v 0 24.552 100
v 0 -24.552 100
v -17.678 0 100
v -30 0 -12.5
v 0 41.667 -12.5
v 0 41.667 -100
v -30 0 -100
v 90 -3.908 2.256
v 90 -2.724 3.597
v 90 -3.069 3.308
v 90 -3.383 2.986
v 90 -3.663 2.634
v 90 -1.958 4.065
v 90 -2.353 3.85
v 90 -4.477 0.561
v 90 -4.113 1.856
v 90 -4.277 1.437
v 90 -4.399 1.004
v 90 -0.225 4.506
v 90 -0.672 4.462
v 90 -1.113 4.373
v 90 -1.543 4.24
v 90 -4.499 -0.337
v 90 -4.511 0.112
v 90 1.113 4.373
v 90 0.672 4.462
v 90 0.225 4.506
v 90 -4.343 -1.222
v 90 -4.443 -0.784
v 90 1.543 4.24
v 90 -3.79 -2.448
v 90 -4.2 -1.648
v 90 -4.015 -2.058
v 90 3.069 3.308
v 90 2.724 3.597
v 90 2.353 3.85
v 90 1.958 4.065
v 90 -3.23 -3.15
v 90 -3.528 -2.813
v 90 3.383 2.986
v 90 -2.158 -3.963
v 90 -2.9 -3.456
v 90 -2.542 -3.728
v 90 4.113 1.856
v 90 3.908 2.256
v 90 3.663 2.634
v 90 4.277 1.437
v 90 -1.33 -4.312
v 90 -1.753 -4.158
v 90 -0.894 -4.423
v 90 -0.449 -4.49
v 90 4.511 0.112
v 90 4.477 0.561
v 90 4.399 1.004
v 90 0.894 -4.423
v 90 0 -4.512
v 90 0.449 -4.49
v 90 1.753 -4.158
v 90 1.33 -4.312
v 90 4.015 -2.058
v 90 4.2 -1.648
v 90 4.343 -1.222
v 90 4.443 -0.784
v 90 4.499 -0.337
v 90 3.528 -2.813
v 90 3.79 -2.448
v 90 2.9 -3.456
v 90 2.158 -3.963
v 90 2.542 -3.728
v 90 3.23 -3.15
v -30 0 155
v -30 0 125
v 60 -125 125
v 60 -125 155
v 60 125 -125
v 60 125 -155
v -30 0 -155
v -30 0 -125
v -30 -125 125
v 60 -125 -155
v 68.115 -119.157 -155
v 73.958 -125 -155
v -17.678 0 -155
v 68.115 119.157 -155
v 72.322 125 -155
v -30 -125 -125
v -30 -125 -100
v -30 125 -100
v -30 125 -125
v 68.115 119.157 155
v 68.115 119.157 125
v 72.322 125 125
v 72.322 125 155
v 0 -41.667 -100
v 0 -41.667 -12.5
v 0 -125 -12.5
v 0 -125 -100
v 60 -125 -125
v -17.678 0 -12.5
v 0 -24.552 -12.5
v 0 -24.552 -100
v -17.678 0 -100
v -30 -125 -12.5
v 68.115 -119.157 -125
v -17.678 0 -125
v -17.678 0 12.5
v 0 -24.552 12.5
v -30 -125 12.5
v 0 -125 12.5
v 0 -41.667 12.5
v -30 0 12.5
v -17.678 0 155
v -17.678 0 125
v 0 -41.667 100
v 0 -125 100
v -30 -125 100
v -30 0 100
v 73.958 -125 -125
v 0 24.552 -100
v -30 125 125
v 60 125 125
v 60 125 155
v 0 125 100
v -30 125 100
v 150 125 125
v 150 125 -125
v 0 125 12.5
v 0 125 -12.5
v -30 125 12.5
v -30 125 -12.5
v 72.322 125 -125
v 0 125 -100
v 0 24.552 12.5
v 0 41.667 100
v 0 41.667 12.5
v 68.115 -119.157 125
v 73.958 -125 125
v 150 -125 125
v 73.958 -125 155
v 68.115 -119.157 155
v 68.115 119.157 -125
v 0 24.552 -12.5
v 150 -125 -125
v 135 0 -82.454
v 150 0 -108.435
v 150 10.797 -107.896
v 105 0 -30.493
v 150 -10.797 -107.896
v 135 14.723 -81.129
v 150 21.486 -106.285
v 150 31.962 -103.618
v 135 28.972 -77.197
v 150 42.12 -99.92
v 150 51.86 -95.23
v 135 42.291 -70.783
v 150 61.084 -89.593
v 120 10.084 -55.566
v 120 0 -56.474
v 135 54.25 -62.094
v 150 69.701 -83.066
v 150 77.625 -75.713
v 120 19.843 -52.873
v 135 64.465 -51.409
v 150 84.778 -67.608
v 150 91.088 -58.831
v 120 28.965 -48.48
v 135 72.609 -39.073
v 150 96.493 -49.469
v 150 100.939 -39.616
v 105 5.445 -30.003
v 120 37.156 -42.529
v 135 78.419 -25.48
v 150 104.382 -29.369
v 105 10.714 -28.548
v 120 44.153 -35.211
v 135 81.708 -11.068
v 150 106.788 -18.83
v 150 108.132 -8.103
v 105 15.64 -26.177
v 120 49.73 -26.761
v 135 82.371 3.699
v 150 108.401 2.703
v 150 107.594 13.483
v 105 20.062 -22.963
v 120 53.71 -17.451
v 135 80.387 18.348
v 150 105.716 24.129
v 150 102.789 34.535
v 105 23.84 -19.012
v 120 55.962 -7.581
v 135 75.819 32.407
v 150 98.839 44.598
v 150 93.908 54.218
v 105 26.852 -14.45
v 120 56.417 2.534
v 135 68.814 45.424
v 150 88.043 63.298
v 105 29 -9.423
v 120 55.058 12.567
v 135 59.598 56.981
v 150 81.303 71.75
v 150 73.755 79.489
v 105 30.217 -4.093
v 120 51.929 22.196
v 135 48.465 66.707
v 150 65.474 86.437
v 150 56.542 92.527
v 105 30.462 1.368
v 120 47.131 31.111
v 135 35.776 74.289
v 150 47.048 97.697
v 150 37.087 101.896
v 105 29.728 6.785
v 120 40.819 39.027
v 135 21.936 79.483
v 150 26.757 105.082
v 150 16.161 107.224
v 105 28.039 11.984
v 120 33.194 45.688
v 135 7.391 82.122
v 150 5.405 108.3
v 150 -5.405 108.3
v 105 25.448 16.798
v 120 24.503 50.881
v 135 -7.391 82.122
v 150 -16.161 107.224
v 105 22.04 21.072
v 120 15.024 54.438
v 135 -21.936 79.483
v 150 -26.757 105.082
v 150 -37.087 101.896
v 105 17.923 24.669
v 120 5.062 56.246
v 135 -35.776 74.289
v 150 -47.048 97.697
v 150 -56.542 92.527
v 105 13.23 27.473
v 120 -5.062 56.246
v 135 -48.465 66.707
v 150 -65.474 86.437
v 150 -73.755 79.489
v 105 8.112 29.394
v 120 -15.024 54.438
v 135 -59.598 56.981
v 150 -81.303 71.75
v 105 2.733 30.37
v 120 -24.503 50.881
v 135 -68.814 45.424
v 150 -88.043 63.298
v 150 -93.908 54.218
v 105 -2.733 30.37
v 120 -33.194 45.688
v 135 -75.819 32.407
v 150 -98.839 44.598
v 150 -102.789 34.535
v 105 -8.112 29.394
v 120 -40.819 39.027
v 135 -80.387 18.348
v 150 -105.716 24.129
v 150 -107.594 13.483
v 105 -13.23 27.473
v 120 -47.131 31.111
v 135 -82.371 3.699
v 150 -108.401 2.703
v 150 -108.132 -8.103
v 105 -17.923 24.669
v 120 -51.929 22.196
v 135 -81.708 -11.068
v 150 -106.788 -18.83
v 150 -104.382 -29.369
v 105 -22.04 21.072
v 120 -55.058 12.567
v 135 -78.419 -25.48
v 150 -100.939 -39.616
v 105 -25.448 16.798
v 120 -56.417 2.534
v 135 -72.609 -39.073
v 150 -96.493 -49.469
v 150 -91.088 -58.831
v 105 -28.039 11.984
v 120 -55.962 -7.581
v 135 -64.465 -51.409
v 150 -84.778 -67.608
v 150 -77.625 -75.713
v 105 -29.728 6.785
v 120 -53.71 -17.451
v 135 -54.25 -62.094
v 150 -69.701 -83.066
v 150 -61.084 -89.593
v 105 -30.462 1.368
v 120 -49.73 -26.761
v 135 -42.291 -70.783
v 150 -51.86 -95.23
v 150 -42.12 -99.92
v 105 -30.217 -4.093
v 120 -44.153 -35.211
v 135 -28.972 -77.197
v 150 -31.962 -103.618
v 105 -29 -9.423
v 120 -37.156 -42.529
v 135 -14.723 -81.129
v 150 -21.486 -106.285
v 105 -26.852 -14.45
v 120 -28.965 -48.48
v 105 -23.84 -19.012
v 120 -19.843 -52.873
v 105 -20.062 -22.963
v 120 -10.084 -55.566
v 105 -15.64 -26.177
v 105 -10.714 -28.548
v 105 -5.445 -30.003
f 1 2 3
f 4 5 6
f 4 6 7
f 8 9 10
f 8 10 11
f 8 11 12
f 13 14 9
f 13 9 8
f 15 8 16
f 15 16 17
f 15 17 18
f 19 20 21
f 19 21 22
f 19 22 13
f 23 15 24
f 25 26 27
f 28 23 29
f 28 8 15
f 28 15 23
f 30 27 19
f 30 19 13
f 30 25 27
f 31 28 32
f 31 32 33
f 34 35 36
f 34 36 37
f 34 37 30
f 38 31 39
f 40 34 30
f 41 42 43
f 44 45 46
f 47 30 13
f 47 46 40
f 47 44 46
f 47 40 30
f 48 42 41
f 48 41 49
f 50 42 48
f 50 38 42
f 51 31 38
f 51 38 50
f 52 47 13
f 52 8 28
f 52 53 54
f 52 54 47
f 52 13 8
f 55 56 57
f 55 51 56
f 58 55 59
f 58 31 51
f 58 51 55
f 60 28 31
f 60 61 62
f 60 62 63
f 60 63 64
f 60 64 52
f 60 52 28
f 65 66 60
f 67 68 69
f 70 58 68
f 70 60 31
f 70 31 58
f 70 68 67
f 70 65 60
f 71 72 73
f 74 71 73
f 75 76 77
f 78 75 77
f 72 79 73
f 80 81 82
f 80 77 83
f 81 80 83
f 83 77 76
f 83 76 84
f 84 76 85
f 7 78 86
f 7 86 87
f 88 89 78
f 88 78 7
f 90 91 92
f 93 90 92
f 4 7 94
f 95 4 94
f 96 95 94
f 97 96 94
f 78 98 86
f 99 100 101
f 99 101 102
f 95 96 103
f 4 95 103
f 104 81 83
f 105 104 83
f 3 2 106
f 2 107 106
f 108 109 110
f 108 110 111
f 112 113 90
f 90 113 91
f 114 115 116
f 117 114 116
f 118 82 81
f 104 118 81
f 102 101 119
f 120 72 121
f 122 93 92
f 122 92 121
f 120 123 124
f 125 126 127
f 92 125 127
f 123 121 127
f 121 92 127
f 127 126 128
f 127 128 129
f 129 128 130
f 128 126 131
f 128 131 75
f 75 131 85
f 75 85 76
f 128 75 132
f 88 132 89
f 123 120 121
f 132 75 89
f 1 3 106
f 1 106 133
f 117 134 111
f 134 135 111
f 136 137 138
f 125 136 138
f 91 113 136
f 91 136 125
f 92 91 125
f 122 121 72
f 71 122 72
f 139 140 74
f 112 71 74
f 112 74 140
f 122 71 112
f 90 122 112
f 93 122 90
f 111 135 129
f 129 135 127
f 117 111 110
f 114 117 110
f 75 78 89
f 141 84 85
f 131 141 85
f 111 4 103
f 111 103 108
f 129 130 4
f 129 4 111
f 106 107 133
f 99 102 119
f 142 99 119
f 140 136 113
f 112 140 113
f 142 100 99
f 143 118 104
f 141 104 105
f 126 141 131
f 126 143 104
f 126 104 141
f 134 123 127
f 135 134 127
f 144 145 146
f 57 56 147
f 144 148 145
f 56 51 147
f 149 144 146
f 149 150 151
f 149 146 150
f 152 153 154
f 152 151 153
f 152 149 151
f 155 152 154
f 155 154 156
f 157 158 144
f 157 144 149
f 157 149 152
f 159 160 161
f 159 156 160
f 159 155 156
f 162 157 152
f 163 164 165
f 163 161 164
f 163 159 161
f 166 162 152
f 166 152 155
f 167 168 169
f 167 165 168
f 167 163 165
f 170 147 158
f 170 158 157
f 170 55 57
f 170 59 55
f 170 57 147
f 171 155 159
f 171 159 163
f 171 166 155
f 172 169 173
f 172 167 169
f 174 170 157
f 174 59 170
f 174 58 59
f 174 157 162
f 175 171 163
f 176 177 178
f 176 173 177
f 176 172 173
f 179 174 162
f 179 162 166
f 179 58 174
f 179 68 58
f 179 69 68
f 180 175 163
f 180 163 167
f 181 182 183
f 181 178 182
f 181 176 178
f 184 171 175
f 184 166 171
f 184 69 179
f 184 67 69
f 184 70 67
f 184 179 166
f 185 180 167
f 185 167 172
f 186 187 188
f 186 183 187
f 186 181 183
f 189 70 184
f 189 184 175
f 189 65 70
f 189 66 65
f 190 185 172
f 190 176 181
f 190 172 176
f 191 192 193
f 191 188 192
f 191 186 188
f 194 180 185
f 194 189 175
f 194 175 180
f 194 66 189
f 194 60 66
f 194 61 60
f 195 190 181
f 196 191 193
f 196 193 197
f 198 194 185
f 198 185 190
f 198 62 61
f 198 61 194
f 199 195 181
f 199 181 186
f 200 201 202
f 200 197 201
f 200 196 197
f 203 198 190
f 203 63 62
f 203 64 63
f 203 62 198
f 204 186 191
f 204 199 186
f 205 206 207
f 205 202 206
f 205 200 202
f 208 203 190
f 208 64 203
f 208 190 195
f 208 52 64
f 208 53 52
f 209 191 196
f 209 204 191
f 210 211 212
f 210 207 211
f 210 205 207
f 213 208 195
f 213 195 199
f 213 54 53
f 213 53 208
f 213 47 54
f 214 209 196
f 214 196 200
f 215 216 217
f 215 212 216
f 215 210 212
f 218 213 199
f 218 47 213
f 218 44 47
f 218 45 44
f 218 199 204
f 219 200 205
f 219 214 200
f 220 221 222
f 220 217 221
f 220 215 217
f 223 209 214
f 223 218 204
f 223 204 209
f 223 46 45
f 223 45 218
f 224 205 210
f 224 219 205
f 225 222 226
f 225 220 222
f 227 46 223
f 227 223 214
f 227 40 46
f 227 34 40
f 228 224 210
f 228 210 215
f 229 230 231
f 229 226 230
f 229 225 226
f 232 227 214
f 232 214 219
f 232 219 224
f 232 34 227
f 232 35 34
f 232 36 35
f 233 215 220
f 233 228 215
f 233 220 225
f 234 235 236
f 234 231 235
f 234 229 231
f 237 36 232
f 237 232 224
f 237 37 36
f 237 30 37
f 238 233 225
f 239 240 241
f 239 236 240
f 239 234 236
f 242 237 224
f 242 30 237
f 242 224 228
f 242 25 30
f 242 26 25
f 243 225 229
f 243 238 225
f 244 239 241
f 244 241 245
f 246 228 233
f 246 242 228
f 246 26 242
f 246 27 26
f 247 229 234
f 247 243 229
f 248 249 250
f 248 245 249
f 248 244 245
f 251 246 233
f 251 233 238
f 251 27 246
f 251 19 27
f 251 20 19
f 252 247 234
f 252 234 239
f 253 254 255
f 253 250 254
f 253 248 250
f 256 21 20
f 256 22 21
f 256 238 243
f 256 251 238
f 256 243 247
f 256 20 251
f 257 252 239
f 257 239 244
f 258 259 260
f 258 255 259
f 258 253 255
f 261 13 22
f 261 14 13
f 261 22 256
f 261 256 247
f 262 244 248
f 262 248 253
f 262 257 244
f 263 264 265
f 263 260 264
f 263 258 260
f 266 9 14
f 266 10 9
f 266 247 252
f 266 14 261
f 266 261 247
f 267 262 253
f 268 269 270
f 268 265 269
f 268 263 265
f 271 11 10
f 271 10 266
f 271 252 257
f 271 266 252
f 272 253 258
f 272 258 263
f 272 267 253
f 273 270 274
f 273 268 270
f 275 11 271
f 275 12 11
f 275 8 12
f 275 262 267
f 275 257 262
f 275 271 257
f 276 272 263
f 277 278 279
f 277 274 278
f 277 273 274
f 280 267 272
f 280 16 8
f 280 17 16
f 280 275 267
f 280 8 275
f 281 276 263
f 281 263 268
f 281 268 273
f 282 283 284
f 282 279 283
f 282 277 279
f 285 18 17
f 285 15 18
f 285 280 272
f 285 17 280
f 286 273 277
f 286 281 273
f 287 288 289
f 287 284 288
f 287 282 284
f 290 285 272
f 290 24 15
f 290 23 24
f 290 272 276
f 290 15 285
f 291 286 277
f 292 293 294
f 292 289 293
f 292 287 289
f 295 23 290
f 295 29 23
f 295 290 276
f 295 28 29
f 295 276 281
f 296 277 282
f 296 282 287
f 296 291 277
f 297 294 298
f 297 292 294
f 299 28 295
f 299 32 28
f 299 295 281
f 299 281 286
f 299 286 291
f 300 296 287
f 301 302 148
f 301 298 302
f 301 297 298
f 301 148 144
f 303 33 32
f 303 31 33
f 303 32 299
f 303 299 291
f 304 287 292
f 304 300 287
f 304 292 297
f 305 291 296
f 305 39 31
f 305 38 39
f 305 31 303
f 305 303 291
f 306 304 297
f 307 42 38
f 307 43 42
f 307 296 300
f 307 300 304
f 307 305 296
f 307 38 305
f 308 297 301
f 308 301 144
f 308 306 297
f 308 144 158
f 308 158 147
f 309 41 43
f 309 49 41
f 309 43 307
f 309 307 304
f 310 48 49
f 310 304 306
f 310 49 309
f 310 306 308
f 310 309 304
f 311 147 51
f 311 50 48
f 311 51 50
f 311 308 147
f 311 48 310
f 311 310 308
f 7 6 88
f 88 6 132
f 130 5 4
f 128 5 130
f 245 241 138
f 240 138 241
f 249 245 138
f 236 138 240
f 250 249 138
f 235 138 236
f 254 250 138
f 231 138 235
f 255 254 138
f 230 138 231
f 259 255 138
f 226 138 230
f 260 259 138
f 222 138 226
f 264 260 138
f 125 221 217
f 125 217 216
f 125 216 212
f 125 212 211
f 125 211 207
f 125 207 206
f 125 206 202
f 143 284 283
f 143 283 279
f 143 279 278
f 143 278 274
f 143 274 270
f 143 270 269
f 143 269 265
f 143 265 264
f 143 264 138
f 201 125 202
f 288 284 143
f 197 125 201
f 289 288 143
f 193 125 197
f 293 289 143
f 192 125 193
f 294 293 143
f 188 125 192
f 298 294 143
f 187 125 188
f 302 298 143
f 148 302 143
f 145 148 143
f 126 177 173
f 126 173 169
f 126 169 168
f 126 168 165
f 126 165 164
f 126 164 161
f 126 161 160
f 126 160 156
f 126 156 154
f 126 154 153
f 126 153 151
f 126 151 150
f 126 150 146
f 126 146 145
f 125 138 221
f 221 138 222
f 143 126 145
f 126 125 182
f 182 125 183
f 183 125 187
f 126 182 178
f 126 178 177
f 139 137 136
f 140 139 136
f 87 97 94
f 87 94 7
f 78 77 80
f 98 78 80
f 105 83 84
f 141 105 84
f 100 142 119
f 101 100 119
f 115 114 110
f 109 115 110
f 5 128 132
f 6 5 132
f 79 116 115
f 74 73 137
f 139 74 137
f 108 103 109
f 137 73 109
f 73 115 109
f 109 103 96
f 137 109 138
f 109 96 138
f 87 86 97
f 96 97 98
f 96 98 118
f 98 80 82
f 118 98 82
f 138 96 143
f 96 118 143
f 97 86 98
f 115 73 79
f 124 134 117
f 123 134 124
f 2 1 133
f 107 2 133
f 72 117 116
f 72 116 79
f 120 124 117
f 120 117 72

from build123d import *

# Parameters (mm, degrees)
IZIM1_W                          = 250
IZIM1_H                          = 250
Y_KSEKLIK_EKSTR_ZYON1_DEPTH      = 150
IZIM2_R                          = 108.43509044
KES_EKSTR_ZYON1_DEPTH            = 60
KES_EKSTR_ZYON1_TAPER            = 60
IZIM3_W                          = 25
IZIM3_H                          = 250
Y_KSEKLIK_EKSTR_ZYON2_DEPTH      = 30
Y_KSEKLIK_EKSTR_ZYON3_DEPTH      = 30
Y_KSEKLIK_EKSTR_ZYON3_DEPTH_BACK = 280


with BuildPart() as part:
    # Çizim1 → Yükseklik-Ekstrüzyon1 (new body)
    with BuildSketch(Plane(origin=(0, 0, 0), x_dir=(0, 0, -1), z_dir=(1, 0, 0))):
        Rectangle(IZIM1_W, IZIM1_H)
    extrude(amount=Y_KSEKLIK_EKSTR_ZYON1_DEPTH)

    # Çizim2 → Kes-Ekstrüzyon1 (cut)
    with BuildSketch(Plane(origin=(150, 0, 0), x_dir=(0, 0, -1), z_dir=(1, 0, 0))):
        Circle(IZIM2_R)
    extrude(amount=-KES_EKSTR_ZYON1_DEPTH, taper=KES_EKSTR_ZYON1_TAPER, mode=Mode.SUBTRACT)

    # Çizim3 → Yükseklik-Ekstrüzyon2 (add)
    with BuildSketch(Plane.ZY):
        with Locations((-112.5, 0)):
            Rectangle(IZIM3_W, IZIM3_H)
        with Locations((112.5, 0)):
            Rectangle(IZIM3_W, IZIM3_H)
        Rectangle(IZIM3_W, IZIM3_H)
    extrude(amount=Y_KSEKLIK_EKSTR_ZYON2_DEPTH)

    # Çizim4 → Yükseklik-Ekstrüzyon3 (add, two sides: drawn at the far end of the back side and taken through both)
    with BuildSketch(Plane.XY.offset(125).offset(-Y_KSEKLIK_EKSTR_ZYON3_DEPTH_BACK)):
        Polygon((60, 125), (-30, 0), (60, -125), (73.958390673, -125), (68.115343415, -119.156952742), (-17.677662559, 0), (68.115343415, 119.156952742), (72.322337441, 125), align=None)
    extrude(amount=Y_KSEKLIK_EKSTR_ZYON3_DEPTH + Y_KSEKLIK_EKSTR_ZYON3_DEPTH_BACK)


solid = part.part
